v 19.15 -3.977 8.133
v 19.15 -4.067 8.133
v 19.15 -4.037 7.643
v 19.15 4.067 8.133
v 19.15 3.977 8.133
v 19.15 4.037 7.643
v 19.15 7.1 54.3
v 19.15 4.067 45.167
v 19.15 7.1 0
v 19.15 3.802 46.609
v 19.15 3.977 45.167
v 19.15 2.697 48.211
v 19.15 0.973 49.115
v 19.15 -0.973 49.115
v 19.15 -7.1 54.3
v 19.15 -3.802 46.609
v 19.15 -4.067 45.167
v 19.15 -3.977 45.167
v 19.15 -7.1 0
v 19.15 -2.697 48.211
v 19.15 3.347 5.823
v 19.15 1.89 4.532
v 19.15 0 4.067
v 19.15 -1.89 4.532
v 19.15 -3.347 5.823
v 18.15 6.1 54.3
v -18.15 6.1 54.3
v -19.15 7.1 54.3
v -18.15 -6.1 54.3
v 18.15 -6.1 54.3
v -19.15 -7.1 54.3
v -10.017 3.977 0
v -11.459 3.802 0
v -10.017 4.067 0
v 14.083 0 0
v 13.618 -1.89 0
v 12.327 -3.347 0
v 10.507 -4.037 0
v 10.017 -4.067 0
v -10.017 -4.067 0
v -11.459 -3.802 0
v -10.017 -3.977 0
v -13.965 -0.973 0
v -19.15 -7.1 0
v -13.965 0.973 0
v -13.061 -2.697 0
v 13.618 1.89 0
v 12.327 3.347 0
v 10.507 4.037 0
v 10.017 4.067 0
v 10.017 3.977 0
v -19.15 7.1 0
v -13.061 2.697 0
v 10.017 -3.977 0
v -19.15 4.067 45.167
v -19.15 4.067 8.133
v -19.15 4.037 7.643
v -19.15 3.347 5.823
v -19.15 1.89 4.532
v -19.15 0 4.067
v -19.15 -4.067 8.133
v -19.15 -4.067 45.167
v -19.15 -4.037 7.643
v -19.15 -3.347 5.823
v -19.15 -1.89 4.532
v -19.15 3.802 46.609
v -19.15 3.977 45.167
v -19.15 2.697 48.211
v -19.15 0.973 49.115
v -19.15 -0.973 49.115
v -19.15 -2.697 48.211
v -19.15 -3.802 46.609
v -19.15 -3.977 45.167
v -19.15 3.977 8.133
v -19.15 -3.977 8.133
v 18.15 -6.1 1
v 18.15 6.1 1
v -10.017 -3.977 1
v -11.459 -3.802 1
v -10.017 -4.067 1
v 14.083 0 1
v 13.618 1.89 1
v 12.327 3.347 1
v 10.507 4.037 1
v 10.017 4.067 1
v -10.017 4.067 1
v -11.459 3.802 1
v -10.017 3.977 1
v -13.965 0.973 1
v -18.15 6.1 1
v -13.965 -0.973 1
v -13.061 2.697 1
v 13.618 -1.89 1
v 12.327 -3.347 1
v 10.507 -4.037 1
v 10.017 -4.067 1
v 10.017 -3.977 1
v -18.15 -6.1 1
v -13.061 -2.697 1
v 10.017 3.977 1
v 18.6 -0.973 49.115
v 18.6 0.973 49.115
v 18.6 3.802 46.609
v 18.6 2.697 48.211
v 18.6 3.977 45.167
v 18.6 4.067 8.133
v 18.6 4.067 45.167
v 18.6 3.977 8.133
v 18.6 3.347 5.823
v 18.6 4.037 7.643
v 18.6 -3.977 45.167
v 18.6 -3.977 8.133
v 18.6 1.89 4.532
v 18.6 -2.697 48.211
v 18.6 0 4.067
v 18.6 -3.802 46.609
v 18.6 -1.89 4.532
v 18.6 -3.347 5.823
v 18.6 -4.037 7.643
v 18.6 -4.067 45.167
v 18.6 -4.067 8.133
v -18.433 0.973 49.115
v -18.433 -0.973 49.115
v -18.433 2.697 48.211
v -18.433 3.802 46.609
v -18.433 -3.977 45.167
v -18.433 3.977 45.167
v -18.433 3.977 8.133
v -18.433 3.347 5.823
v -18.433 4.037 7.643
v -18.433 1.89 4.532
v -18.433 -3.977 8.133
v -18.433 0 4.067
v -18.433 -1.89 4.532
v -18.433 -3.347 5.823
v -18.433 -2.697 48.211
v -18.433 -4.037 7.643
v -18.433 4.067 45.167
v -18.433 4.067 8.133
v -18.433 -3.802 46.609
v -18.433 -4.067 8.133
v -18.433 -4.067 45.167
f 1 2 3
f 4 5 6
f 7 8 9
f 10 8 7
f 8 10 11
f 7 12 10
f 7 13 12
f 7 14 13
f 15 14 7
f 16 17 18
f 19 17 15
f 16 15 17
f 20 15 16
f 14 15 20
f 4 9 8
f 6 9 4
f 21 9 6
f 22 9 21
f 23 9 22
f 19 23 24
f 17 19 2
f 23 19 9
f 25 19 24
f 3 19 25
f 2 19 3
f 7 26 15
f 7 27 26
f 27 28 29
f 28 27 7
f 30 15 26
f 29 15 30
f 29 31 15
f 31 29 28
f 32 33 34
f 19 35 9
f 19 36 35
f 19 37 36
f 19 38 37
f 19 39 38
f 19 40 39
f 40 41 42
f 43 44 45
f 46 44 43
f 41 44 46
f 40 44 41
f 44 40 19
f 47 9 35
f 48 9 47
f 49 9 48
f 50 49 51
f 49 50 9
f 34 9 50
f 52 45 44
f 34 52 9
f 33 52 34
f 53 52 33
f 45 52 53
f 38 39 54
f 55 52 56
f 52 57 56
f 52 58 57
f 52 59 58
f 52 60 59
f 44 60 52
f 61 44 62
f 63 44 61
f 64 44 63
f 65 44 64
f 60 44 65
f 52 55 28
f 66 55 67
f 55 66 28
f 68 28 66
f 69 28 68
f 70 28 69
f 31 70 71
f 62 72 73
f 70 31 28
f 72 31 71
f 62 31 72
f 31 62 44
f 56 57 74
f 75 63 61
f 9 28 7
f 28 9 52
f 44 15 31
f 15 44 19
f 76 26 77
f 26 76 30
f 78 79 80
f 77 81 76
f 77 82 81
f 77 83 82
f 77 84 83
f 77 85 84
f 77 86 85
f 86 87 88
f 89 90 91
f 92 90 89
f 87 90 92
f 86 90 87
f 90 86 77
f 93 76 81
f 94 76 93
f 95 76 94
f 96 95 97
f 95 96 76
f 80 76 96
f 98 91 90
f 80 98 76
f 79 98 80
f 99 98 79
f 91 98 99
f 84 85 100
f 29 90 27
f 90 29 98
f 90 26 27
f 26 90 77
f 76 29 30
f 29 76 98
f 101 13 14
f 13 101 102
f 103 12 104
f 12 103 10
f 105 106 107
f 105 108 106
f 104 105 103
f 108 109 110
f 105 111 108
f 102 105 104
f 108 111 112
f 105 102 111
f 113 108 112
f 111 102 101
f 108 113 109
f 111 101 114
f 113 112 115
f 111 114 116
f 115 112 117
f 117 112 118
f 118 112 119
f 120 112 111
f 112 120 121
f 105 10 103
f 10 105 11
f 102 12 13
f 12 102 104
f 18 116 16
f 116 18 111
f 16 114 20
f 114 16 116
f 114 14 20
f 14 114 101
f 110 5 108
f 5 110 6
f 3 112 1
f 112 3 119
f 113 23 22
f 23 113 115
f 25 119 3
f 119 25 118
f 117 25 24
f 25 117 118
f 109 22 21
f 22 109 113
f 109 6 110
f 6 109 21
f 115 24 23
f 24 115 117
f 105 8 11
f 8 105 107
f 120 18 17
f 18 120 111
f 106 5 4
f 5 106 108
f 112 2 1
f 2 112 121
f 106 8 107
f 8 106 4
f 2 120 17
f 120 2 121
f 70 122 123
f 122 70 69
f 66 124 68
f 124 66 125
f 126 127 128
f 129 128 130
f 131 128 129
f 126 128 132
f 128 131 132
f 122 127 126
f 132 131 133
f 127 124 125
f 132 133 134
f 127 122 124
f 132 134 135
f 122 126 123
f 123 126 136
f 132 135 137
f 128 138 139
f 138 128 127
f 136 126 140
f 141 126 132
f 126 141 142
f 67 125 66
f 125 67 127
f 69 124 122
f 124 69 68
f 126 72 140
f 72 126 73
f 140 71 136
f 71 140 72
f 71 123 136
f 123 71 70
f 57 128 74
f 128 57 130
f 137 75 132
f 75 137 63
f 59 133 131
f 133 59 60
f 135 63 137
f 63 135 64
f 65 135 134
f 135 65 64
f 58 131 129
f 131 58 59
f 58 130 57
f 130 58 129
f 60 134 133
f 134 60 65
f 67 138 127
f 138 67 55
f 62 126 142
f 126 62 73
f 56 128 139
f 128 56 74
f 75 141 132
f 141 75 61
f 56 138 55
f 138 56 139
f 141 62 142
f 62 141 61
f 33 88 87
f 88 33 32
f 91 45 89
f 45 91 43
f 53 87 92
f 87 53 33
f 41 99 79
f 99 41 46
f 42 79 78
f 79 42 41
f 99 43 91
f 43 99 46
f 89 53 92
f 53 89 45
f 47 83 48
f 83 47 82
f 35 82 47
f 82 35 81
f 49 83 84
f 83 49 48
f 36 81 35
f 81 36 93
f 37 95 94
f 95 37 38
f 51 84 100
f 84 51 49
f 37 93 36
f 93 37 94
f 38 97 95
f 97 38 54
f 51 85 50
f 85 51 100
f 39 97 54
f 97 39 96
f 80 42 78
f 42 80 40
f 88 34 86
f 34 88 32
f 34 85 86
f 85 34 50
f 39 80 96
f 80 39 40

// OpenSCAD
//sof
// --------------------------------------------------------

//match case
width=36.3;
thickness=12.2;
height=53.3;

shell=1;

paper=0.4;

// left and bottom slot
slot=thickness/1.5;

// main slot
mainslotdelta=4;
mainslotw=width-mainslotdelta;
mainsloth=height-mainslotdelta;

// --------------------------------------------------------

module mainRectPlate() { union() {

    
// middle plate rectangle
translate([-mainslotw/2,thickness/2-slot/4,mainslotdelta/2+slot/2]){
    cube([mainslotw, shell*4, mainsloth-slot]);
}

// cross rectangle
translate([-mainslotw/2+slot/2,thickness/2-slot/4,mainslotdelta/2]){
    cube([mainslotw-slot, shell*4, mainsloth]);
}

// circle top left
translate([mainslotw/2-slot/2,
           thickness/2+2*shell,
           mainsloth-slot/2+mainslotdelta/2]){
    rotate(a = 90, v=[1, 0, 0]) cylinder(r=slot/2, h=shell*4);
}

// circle top right
translate([-mainslotw/2+slot/2,
           thickness/2+2*shell,
           mainsloth-slot/2+mainslotdelta/2]){
    rotate(a = 90, v=[1, 0, 0]) cylinder(r=slot/2, h=shell*4);
}

// circle bottom left
translate([mainslotw/2-slot/2,
           thickness/2+2*shell,
           slot/2+mainslotdelta/2]){
    rotate(a = 90, v=[1, 0, 0]) cylinder(r=slot/2, h=shell*4);
}

// circle bottom right
translate([-mainslotw/2+slot/2,
           thickness/2+2*shell,
           slot/2+mainslotdelta/2]){
    rotate(a = 90, v=[1, 0, 0]) cylinder(r=slot/2, h=shell*4);
}

}}

// --------------------------------------------------------

module mainRhombusPlate1() {
    resize([mainslotw,shell*4,mainsloth])
    translate([-(mainslotw*sqrt(2))/4,0,(mainslotw*sqrt(2))/4])
    rotate(a=45, v=[0,1,0])
    resize([mainslotw,shell*4,mainslotw])
    mainRectPlate();
}

module mainRhombusPlate() { union() {

mainRhombusPlate1();

}}

// --------------------------------------------------------

module leftPlate() {union() {
    
//circle1
translate([width/2.2,0,height-slot]){
rotate(a = 90, v=[0, 1, 0]) cylinder(r=slot/2, h=shell*4);
}

//circle2
translate([width/2.2,0,slot]){
rotate(a = 90, v=[0, 1, 0]) cylinder(r=slot/2, h=shell*4);
}

//rectangle
translate([width/2.2,-slot/2,slot]){
    cube([shell*4, slot, (height-slot*2)]);
}

}}

module rightPlate() {
    
    translate([-width-slot/4,0,0])leftPlate();

}

// --------------------------------------------------------

module bottomPlate() { union() {

// circle1
translate([-width*0.5+slot,0,-shell*2]){
    cylinder(r=slot/2, h=shell*4);
}

//circle2
translate([width*0.5-slot,0,-shell*2]){
    cylinder(r=slot/2, h=shell*4);
}

//rectangle
translate([-width*0.5+slot,-slot/2,-shell*2]){
    cube([width-slot*2, slot, shell*4]);
}

}}

// --------------------------------------------------------

module mainBox() { difference() {

//outside box
translate([-(width+shell*2)/2,-(thickness+shell*2)/2,0]){
    cube([width+shell*2, thickness+shell*2, height+shell]);
    }

//inside box
translate([-width/2,-thickness/2,shell]){
    cube([width, thickness, height+shell*2]);
    }

}}

// --------------------------------------------------------
// image

module image() {
    name="matchbox-pipe-template-heights-small.png";
    // name="matchbox-pipe-template-heights.png";
    
    moveby=thickness/2+2*shell;
    
    translate([-width/2,-moveby,height])
    rotate(a=90, v=[0,1,0])
    rotate(a=90, v=[1,0,0])
    resize([height,width,shell])
    surface(file=name, invert=true);
}

// --------------------------------------------------------
// cover

module openedCover() {difference(){

mainBox();
    
//mainRectPlate();
mainRhombusPlate();
leftPlate();
rightPlate();
bottomPlate();

}}

module closedCover() {difference(){

mainBox();
    
leftPlate();
rightPlate();
bottomPlate();

}}

module fullCover() {difference(){

mainBox();
    
translate([shell*3-shell/2-paper,0,0])leftPlate();
translate([-shell+paper,0,0])rightPlate();
bottomPlate();

}}

module imageCover() {union() {
    
    image();fullCover();
    
}}

// --------------------------------------------------------
// drawer

module drawer() { difference() {
    gapW = 0.2;
    gapH = 0.2;
    
    x = width-2*gapW;
    y = thickness-2*gapH;
    z = height;
    
    //outside box
    cube([x, y, z]);
    
    //inside box
    translate([shell,2*shell,shell])cube([x-2*shell, y-shell, z-2*shell]);

//inside box

}}

// --------------------------------------------------------
// main part

    
//drawer();

fullCover();

//imageCover();


// --------------------------------------------------------
// eof
